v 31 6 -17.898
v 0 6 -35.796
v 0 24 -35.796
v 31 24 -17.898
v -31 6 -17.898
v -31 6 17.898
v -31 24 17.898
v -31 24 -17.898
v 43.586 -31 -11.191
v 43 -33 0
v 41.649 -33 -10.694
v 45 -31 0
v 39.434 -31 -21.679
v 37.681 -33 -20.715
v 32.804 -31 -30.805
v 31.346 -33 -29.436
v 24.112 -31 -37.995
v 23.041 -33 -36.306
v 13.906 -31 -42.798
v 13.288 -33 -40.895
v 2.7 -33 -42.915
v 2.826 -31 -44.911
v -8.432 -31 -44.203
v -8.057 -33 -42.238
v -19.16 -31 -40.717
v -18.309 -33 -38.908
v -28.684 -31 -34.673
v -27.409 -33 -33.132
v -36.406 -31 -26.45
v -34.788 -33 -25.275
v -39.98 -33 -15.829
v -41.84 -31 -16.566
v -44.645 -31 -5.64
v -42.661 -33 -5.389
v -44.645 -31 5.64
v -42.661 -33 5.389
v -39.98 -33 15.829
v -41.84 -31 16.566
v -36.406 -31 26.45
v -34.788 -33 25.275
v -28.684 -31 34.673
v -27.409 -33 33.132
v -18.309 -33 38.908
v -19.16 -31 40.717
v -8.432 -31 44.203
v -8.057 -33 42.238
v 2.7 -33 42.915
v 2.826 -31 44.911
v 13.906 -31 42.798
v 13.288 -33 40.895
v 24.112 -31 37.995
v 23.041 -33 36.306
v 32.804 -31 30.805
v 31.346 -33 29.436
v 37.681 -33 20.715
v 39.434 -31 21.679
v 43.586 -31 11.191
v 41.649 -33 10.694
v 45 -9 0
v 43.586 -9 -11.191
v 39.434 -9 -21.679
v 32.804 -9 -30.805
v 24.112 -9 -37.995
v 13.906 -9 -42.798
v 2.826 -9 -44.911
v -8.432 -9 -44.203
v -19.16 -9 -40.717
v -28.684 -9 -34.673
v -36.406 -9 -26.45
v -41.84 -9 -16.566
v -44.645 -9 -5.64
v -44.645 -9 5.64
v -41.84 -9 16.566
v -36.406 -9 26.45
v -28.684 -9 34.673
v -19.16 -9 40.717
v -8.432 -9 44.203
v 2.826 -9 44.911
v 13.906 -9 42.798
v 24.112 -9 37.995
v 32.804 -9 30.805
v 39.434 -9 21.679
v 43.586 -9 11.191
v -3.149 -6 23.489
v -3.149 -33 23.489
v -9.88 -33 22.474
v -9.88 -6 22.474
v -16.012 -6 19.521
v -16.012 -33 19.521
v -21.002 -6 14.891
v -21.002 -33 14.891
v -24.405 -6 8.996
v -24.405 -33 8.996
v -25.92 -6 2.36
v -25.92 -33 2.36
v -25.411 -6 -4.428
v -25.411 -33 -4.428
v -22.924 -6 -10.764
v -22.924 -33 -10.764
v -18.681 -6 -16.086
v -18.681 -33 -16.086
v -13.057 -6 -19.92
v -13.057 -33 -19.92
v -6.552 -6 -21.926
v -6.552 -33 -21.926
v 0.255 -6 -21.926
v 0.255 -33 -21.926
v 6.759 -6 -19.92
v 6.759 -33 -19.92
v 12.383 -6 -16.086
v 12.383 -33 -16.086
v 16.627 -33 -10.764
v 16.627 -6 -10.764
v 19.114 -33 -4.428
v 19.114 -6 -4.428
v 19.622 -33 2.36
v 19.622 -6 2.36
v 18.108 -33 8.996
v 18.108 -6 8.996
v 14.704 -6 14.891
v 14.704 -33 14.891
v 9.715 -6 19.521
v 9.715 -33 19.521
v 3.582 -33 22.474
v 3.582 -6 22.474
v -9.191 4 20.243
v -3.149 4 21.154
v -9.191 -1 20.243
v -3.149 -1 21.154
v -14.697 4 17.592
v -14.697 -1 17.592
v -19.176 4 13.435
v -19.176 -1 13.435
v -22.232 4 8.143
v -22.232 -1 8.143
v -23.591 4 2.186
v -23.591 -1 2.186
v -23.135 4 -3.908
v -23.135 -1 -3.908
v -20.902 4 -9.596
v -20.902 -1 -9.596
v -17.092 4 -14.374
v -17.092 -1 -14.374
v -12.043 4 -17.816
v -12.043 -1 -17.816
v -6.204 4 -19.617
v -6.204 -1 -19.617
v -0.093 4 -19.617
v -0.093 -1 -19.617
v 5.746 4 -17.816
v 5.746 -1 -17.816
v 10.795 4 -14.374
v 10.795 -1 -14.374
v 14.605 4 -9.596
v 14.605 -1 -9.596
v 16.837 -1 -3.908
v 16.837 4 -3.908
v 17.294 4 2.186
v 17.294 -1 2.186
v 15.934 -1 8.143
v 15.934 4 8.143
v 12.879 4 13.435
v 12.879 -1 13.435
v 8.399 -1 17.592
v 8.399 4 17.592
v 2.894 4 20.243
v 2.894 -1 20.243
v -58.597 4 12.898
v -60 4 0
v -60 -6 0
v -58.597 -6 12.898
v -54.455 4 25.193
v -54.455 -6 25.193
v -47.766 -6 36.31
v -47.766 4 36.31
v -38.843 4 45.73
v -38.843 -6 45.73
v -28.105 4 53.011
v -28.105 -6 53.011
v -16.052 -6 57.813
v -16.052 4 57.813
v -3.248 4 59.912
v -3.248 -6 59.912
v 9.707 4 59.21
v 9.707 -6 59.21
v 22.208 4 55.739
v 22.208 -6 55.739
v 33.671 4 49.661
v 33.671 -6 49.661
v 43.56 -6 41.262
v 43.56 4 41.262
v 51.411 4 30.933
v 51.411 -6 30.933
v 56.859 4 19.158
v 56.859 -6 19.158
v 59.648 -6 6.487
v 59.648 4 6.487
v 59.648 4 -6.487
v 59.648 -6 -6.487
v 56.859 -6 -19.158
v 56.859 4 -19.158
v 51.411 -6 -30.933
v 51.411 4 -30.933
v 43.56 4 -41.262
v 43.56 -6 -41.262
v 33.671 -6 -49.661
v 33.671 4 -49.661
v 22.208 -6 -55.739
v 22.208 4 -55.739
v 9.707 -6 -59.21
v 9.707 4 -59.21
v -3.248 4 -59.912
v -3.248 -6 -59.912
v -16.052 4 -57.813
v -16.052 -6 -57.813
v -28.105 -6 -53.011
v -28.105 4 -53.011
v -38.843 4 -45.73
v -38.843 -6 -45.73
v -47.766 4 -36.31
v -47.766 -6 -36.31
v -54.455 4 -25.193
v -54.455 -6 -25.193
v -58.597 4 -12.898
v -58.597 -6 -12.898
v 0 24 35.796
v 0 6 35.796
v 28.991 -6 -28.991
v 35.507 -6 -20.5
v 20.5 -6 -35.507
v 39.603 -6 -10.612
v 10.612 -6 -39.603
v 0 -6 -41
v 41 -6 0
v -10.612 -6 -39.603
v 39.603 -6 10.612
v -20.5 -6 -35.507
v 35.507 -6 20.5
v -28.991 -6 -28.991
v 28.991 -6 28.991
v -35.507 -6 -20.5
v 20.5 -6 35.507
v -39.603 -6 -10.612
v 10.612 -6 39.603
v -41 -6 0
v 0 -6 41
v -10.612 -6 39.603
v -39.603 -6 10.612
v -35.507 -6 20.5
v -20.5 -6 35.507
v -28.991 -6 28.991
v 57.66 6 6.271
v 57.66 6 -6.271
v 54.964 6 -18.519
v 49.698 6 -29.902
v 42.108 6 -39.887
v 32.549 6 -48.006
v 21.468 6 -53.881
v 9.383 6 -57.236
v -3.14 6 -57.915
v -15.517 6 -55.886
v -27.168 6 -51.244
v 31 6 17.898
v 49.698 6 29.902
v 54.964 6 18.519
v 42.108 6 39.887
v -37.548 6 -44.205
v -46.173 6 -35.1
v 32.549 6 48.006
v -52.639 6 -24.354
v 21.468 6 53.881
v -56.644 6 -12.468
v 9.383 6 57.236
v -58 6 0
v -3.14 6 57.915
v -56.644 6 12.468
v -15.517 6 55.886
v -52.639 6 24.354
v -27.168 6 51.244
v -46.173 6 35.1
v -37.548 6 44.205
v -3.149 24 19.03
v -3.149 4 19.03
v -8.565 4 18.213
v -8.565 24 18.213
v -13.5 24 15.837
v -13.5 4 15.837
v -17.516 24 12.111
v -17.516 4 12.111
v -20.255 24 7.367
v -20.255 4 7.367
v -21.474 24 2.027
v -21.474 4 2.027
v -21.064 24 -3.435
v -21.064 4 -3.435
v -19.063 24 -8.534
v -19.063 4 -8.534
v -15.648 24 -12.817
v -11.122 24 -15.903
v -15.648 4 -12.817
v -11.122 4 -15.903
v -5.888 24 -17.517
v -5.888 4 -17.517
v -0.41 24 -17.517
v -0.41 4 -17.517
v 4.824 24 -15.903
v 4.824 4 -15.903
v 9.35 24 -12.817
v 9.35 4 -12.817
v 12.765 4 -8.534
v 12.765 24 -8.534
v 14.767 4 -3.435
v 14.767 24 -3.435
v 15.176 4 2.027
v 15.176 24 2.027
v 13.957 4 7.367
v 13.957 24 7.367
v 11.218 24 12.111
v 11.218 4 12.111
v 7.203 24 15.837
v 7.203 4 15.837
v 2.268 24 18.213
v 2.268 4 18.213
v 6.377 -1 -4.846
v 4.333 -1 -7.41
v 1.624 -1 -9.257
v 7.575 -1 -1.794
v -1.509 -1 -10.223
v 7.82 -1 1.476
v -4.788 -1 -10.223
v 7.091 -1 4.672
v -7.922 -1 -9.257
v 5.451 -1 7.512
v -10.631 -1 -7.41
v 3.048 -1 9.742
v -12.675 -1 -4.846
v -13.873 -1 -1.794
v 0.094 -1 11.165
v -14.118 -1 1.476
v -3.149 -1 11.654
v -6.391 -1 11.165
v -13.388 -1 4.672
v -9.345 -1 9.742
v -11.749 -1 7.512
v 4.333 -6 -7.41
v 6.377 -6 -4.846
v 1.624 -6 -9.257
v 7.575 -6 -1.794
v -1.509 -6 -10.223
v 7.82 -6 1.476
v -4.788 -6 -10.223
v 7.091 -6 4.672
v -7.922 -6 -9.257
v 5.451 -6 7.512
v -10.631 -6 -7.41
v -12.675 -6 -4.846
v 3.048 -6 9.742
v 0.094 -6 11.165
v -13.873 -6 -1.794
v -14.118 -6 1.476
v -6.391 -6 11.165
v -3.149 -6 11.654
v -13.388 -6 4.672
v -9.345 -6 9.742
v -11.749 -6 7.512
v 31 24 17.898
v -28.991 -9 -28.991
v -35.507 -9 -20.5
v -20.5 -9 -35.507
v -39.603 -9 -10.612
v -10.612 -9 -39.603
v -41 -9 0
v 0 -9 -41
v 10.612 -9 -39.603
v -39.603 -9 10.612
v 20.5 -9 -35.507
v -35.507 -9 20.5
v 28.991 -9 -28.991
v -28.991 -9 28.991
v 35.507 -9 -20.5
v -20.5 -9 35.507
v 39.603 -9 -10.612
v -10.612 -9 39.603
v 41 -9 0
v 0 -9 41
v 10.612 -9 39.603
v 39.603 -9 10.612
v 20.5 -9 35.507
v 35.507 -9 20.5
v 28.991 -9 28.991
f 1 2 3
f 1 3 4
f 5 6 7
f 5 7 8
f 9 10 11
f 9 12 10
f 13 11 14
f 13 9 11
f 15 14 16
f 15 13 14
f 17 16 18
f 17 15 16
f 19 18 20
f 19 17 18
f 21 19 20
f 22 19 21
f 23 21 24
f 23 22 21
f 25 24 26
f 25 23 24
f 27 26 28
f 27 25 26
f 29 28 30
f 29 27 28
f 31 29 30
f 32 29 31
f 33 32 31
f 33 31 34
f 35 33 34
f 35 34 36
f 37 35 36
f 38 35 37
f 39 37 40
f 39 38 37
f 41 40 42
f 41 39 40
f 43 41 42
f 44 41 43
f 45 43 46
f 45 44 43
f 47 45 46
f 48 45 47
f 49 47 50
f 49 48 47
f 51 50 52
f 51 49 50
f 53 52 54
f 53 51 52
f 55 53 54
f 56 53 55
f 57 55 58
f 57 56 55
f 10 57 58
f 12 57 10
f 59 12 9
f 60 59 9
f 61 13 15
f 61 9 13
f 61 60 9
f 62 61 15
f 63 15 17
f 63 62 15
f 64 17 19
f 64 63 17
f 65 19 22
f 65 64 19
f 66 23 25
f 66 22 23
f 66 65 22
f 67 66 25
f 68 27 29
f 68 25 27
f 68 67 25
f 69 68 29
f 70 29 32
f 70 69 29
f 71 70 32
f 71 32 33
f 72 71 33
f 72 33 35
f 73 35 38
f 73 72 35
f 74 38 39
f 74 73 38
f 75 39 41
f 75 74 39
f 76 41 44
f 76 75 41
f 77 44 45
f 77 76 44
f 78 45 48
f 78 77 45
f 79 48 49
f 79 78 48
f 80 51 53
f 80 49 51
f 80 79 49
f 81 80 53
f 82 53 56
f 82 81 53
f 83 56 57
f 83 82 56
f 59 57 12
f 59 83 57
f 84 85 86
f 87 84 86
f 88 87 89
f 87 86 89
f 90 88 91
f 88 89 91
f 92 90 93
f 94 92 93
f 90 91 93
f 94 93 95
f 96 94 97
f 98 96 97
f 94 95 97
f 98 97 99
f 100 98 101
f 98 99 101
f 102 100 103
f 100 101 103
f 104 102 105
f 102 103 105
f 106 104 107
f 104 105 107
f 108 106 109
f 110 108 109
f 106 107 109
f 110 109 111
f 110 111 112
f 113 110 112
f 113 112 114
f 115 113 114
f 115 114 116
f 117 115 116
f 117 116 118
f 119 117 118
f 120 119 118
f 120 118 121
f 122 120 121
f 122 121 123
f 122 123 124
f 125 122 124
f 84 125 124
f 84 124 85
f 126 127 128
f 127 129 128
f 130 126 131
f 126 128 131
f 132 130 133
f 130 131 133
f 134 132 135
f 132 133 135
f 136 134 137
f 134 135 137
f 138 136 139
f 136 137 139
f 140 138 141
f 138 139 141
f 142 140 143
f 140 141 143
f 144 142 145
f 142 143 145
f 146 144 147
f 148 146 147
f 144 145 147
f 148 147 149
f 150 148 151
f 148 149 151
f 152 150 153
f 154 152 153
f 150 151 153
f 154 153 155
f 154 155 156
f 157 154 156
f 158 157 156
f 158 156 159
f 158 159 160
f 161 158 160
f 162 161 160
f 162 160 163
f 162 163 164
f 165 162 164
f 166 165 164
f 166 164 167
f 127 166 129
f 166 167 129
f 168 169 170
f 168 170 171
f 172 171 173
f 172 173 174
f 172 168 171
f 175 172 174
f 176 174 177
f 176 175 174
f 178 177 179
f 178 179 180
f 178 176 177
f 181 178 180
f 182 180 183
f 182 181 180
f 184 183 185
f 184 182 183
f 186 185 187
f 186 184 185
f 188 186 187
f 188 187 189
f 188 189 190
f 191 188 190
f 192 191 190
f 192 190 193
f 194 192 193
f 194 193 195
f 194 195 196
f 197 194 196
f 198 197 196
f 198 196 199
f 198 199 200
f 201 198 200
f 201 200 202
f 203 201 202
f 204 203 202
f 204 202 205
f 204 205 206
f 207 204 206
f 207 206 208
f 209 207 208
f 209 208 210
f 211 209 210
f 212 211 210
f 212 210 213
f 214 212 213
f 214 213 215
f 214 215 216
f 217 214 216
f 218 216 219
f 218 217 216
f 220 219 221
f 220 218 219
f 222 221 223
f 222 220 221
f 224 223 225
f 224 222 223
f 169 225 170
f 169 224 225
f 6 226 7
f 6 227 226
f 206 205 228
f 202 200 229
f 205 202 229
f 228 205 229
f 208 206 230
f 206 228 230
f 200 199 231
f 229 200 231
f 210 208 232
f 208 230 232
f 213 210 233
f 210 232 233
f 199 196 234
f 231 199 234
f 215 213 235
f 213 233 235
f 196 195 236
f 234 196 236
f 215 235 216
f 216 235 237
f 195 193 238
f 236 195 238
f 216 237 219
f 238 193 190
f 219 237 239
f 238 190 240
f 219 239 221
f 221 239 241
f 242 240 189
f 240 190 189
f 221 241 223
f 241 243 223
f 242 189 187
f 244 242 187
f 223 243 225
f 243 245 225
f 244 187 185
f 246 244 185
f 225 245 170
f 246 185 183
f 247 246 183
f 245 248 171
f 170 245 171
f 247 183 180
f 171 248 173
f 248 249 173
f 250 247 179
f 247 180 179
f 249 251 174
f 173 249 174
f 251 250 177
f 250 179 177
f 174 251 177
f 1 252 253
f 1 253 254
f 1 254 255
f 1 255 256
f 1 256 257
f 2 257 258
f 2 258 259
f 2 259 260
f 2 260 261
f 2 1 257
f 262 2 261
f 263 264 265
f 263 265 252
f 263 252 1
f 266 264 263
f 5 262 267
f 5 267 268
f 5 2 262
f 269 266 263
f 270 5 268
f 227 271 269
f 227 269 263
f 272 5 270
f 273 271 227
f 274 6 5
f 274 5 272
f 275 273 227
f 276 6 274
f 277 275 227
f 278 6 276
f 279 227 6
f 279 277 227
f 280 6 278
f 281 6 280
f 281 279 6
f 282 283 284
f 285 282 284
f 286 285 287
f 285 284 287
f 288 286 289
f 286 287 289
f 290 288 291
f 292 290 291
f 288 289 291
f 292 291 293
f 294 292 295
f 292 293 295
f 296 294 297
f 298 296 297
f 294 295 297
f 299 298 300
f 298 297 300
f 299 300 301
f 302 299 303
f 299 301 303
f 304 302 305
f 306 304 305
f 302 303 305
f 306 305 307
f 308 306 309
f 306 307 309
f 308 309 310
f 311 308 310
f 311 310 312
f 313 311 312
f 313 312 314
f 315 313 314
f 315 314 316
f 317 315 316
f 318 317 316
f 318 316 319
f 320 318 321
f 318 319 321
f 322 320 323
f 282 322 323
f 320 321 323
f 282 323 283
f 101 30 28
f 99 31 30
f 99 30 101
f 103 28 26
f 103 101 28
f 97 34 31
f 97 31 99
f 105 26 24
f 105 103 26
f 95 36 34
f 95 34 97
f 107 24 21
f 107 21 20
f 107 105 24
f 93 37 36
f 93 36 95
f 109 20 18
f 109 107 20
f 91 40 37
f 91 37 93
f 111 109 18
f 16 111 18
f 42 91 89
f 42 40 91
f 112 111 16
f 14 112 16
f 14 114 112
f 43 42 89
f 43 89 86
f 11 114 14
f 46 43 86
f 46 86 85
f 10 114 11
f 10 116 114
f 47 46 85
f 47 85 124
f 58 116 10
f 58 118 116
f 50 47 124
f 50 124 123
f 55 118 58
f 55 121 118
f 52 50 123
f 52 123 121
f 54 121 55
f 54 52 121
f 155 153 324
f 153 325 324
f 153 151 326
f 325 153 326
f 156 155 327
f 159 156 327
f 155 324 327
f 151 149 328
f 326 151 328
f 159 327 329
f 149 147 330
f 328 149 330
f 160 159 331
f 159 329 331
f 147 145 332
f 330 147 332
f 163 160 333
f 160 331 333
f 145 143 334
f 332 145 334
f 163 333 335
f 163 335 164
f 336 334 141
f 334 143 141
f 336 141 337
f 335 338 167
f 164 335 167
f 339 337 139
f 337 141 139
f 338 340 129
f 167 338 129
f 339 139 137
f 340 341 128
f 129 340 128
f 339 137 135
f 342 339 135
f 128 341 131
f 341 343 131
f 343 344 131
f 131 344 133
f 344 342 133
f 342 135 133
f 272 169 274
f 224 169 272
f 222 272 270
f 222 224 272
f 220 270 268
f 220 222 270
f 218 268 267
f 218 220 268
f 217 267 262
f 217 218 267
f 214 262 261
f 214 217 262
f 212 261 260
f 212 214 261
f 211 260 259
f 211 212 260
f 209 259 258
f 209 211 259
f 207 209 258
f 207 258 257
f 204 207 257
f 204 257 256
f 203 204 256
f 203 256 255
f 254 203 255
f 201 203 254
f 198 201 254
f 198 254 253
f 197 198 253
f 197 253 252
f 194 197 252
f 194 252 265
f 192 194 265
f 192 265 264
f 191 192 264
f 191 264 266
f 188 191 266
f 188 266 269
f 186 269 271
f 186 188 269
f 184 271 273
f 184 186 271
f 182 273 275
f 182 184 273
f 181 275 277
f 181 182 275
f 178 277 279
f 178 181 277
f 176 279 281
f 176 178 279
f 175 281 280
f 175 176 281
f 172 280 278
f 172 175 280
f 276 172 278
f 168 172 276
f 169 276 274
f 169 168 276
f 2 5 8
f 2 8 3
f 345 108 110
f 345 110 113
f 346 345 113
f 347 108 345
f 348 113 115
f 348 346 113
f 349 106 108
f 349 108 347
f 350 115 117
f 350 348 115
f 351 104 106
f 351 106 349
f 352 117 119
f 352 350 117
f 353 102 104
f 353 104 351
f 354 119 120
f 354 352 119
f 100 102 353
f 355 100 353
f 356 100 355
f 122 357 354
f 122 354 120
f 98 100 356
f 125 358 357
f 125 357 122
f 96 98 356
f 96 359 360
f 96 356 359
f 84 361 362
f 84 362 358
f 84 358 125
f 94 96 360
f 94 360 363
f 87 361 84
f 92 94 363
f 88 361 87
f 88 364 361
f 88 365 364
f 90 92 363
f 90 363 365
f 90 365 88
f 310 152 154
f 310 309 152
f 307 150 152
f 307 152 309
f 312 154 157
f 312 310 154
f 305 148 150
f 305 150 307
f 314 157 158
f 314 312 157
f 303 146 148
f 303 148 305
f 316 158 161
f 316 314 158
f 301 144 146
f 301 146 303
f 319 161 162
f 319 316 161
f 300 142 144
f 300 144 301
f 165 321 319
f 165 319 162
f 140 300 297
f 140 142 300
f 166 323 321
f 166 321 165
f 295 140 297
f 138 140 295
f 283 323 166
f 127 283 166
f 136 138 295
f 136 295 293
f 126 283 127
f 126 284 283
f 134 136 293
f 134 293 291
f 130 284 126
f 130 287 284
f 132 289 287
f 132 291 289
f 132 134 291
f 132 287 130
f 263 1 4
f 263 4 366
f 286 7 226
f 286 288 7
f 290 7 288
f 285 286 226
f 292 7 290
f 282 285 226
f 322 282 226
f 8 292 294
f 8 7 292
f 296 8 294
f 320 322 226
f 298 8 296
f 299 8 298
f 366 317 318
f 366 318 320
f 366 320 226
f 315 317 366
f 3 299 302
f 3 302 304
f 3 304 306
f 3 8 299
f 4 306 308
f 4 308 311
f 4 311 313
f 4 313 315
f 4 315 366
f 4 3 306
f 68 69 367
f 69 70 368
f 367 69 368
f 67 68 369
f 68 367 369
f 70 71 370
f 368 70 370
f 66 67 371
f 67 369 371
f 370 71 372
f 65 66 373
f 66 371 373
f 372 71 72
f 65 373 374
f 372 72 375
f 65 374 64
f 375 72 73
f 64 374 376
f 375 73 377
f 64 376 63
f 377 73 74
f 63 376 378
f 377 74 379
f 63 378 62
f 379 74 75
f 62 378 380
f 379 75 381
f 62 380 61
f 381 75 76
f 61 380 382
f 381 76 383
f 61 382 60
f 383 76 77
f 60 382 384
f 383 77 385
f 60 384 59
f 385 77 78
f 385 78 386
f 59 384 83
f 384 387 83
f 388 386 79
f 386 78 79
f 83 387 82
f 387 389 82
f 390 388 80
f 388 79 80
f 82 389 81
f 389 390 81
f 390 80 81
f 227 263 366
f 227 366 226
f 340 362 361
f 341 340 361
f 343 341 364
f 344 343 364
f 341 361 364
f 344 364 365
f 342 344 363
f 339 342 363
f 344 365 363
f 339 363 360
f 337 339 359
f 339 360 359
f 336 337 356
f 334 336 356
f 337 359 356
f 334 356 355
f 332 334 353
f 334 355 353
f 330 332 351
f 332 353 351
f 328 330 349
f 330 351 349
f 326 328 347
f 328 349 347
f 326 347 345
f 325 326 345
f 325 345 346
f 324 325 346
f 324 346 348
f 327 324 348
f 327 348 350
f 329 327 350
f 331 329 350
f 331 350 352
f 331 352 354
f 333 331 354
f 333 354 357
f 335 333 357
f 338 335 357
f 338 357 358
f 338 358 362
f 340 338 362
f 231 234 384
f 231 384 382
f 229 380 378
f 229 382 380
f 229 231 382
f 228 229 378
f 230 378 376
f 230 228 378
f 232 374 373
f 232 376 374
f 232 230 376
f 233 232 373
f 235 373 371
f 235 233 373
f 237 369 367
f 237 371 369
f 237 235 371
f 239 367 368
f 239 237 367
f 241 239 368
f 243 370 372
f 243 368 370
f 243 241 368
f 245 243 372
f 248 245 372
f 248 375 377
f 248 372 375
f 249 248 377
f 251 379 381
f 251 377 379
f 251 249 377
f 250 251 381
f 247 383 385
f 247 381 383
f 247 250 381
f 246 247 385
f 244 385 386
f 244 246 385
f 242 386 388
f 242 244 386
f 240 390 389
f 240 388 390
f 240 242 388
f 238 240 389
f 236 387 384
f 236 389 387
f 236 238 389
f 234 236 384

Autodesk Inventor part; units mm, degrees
ref_plane "YZ Plane" through (0, 0, 0) normal (1, 0, 0) x (0, 1, 0)
ref_plane "XZ Plane" through (0, 0, 0) normal (0, 1, 0) x (-1, 0, 0)
ref_plane "XY Plane" through (0, 0, 0) normal (0, 0, 1) x (1, 0, 0)
sketch "草图1" plane through (0, 0, 0) normal (0, 1, 0) x (-1, 0, 0)
  circle A0 centre (0, 0) radius 60
  dimension "d0" = 120
extrude "拉伸1" add sketch "草图1" along normal mid plane 12
sketch "草图2" plane through (0, -6, 0) normal (0, -1, 0) x (1, 0, 0)
  circle A0 centre (0, 0) radius 41
  dimension "d3" = 82
extrude "拉伸2" add sketch "草图2" along normal blind 3
sketch "草图3" plane through (0, -9, 0) normal (0, -1, 0) x (1, 0, 0)
  circle A0 centre (0, 0) radius 45
  dimension "d6" = 90
extrude "拉伸3" add sketch "草图3" along normal blind 24
thread "螺纹1" size "M90x6" class "6g" standard "GB Metric profile" full length
sketch "草图4" plane through (0, 6, 0) normal (0, 1, 0) x (1, 0, 0)
  line L0 (-31, 17.8979) -> (0, 35.7957)
  line L1 (0, 35.7957) -> (31, 17.8979)
  line L2 (31, 17.8979) -> (31, -17.8979)
  line L3 (31, -17.8979) -> (0, -35.7957)
  line L4 (0, -35.7957) -> (-31, -17.8979)
  line L5 (-31, -17.8979) -> (-31, 17.8979)
  point P0 (0, 0)
  point P1 (0, 0)
  dimension "d11" = 62
extrude "拉伸4" add sketch "草图4" along normal blind 18
sketch "草图5" plane through (0, 24, 0) normal (0, 1, 0) x (1, 0, 0)
  line L0 (0, 35.7957) -> (-31, 17.8979) projected
  point P0 (0, 0)
  point P1 (-3.1488, -0.6537)
  dimension "d14" = 29.9917
hole "孔1" at (-3.1488, 24, 0.6537) direction (0, -1, 0) diameter 36.7524 depth 20 thread size "M40x3" class "6H" standard "GB Metric profile"
sketch "草图6" plane through (-3.1488, 4, 0.6537) normal (0, 1, 0) x (1, 0, 0)
  circle A0 centre (0, 0) radius 18.3762 projected
  point P0 (3.1488, 0.6537)
hole "孔2" at (-3.1488, 4, 0.6537) direction (0, -1, 0) diameter 41 depth 5
sketch "草图7" plane through (-3.1488, -1, 0.6537) normal (0, 1, 0) x (1, 0, 0)
  circle A0 centre (0, 0) radius 20.5 projected
  point P0 (3.1488, 0.6537)
hole "孔3" at (-3.1488, -1, 0.6537) direction (0, -1, 0) diameter 22 depth 5
sketch "草图8" plane through (-3.1488, -6, 0.6537) normal (0, 1, 0) x (1, 0, 0)
  circle A0 centre (0, 0) radius 11 projected
  point P0 (3.1488, 0.6537)
hole "孔4" at (-3.1488, -6, 0.6537) direction (0, -1, 0) diameter 45.6699 end through all thread size "M50x4" class "6H" standard "GB Metric profile"
chamfer "倒角1" distance 2 angle 45 2 edges at (60, 6, 0) (-45, -33, 0)
properties part number "螺盖" material "不锈钢"
